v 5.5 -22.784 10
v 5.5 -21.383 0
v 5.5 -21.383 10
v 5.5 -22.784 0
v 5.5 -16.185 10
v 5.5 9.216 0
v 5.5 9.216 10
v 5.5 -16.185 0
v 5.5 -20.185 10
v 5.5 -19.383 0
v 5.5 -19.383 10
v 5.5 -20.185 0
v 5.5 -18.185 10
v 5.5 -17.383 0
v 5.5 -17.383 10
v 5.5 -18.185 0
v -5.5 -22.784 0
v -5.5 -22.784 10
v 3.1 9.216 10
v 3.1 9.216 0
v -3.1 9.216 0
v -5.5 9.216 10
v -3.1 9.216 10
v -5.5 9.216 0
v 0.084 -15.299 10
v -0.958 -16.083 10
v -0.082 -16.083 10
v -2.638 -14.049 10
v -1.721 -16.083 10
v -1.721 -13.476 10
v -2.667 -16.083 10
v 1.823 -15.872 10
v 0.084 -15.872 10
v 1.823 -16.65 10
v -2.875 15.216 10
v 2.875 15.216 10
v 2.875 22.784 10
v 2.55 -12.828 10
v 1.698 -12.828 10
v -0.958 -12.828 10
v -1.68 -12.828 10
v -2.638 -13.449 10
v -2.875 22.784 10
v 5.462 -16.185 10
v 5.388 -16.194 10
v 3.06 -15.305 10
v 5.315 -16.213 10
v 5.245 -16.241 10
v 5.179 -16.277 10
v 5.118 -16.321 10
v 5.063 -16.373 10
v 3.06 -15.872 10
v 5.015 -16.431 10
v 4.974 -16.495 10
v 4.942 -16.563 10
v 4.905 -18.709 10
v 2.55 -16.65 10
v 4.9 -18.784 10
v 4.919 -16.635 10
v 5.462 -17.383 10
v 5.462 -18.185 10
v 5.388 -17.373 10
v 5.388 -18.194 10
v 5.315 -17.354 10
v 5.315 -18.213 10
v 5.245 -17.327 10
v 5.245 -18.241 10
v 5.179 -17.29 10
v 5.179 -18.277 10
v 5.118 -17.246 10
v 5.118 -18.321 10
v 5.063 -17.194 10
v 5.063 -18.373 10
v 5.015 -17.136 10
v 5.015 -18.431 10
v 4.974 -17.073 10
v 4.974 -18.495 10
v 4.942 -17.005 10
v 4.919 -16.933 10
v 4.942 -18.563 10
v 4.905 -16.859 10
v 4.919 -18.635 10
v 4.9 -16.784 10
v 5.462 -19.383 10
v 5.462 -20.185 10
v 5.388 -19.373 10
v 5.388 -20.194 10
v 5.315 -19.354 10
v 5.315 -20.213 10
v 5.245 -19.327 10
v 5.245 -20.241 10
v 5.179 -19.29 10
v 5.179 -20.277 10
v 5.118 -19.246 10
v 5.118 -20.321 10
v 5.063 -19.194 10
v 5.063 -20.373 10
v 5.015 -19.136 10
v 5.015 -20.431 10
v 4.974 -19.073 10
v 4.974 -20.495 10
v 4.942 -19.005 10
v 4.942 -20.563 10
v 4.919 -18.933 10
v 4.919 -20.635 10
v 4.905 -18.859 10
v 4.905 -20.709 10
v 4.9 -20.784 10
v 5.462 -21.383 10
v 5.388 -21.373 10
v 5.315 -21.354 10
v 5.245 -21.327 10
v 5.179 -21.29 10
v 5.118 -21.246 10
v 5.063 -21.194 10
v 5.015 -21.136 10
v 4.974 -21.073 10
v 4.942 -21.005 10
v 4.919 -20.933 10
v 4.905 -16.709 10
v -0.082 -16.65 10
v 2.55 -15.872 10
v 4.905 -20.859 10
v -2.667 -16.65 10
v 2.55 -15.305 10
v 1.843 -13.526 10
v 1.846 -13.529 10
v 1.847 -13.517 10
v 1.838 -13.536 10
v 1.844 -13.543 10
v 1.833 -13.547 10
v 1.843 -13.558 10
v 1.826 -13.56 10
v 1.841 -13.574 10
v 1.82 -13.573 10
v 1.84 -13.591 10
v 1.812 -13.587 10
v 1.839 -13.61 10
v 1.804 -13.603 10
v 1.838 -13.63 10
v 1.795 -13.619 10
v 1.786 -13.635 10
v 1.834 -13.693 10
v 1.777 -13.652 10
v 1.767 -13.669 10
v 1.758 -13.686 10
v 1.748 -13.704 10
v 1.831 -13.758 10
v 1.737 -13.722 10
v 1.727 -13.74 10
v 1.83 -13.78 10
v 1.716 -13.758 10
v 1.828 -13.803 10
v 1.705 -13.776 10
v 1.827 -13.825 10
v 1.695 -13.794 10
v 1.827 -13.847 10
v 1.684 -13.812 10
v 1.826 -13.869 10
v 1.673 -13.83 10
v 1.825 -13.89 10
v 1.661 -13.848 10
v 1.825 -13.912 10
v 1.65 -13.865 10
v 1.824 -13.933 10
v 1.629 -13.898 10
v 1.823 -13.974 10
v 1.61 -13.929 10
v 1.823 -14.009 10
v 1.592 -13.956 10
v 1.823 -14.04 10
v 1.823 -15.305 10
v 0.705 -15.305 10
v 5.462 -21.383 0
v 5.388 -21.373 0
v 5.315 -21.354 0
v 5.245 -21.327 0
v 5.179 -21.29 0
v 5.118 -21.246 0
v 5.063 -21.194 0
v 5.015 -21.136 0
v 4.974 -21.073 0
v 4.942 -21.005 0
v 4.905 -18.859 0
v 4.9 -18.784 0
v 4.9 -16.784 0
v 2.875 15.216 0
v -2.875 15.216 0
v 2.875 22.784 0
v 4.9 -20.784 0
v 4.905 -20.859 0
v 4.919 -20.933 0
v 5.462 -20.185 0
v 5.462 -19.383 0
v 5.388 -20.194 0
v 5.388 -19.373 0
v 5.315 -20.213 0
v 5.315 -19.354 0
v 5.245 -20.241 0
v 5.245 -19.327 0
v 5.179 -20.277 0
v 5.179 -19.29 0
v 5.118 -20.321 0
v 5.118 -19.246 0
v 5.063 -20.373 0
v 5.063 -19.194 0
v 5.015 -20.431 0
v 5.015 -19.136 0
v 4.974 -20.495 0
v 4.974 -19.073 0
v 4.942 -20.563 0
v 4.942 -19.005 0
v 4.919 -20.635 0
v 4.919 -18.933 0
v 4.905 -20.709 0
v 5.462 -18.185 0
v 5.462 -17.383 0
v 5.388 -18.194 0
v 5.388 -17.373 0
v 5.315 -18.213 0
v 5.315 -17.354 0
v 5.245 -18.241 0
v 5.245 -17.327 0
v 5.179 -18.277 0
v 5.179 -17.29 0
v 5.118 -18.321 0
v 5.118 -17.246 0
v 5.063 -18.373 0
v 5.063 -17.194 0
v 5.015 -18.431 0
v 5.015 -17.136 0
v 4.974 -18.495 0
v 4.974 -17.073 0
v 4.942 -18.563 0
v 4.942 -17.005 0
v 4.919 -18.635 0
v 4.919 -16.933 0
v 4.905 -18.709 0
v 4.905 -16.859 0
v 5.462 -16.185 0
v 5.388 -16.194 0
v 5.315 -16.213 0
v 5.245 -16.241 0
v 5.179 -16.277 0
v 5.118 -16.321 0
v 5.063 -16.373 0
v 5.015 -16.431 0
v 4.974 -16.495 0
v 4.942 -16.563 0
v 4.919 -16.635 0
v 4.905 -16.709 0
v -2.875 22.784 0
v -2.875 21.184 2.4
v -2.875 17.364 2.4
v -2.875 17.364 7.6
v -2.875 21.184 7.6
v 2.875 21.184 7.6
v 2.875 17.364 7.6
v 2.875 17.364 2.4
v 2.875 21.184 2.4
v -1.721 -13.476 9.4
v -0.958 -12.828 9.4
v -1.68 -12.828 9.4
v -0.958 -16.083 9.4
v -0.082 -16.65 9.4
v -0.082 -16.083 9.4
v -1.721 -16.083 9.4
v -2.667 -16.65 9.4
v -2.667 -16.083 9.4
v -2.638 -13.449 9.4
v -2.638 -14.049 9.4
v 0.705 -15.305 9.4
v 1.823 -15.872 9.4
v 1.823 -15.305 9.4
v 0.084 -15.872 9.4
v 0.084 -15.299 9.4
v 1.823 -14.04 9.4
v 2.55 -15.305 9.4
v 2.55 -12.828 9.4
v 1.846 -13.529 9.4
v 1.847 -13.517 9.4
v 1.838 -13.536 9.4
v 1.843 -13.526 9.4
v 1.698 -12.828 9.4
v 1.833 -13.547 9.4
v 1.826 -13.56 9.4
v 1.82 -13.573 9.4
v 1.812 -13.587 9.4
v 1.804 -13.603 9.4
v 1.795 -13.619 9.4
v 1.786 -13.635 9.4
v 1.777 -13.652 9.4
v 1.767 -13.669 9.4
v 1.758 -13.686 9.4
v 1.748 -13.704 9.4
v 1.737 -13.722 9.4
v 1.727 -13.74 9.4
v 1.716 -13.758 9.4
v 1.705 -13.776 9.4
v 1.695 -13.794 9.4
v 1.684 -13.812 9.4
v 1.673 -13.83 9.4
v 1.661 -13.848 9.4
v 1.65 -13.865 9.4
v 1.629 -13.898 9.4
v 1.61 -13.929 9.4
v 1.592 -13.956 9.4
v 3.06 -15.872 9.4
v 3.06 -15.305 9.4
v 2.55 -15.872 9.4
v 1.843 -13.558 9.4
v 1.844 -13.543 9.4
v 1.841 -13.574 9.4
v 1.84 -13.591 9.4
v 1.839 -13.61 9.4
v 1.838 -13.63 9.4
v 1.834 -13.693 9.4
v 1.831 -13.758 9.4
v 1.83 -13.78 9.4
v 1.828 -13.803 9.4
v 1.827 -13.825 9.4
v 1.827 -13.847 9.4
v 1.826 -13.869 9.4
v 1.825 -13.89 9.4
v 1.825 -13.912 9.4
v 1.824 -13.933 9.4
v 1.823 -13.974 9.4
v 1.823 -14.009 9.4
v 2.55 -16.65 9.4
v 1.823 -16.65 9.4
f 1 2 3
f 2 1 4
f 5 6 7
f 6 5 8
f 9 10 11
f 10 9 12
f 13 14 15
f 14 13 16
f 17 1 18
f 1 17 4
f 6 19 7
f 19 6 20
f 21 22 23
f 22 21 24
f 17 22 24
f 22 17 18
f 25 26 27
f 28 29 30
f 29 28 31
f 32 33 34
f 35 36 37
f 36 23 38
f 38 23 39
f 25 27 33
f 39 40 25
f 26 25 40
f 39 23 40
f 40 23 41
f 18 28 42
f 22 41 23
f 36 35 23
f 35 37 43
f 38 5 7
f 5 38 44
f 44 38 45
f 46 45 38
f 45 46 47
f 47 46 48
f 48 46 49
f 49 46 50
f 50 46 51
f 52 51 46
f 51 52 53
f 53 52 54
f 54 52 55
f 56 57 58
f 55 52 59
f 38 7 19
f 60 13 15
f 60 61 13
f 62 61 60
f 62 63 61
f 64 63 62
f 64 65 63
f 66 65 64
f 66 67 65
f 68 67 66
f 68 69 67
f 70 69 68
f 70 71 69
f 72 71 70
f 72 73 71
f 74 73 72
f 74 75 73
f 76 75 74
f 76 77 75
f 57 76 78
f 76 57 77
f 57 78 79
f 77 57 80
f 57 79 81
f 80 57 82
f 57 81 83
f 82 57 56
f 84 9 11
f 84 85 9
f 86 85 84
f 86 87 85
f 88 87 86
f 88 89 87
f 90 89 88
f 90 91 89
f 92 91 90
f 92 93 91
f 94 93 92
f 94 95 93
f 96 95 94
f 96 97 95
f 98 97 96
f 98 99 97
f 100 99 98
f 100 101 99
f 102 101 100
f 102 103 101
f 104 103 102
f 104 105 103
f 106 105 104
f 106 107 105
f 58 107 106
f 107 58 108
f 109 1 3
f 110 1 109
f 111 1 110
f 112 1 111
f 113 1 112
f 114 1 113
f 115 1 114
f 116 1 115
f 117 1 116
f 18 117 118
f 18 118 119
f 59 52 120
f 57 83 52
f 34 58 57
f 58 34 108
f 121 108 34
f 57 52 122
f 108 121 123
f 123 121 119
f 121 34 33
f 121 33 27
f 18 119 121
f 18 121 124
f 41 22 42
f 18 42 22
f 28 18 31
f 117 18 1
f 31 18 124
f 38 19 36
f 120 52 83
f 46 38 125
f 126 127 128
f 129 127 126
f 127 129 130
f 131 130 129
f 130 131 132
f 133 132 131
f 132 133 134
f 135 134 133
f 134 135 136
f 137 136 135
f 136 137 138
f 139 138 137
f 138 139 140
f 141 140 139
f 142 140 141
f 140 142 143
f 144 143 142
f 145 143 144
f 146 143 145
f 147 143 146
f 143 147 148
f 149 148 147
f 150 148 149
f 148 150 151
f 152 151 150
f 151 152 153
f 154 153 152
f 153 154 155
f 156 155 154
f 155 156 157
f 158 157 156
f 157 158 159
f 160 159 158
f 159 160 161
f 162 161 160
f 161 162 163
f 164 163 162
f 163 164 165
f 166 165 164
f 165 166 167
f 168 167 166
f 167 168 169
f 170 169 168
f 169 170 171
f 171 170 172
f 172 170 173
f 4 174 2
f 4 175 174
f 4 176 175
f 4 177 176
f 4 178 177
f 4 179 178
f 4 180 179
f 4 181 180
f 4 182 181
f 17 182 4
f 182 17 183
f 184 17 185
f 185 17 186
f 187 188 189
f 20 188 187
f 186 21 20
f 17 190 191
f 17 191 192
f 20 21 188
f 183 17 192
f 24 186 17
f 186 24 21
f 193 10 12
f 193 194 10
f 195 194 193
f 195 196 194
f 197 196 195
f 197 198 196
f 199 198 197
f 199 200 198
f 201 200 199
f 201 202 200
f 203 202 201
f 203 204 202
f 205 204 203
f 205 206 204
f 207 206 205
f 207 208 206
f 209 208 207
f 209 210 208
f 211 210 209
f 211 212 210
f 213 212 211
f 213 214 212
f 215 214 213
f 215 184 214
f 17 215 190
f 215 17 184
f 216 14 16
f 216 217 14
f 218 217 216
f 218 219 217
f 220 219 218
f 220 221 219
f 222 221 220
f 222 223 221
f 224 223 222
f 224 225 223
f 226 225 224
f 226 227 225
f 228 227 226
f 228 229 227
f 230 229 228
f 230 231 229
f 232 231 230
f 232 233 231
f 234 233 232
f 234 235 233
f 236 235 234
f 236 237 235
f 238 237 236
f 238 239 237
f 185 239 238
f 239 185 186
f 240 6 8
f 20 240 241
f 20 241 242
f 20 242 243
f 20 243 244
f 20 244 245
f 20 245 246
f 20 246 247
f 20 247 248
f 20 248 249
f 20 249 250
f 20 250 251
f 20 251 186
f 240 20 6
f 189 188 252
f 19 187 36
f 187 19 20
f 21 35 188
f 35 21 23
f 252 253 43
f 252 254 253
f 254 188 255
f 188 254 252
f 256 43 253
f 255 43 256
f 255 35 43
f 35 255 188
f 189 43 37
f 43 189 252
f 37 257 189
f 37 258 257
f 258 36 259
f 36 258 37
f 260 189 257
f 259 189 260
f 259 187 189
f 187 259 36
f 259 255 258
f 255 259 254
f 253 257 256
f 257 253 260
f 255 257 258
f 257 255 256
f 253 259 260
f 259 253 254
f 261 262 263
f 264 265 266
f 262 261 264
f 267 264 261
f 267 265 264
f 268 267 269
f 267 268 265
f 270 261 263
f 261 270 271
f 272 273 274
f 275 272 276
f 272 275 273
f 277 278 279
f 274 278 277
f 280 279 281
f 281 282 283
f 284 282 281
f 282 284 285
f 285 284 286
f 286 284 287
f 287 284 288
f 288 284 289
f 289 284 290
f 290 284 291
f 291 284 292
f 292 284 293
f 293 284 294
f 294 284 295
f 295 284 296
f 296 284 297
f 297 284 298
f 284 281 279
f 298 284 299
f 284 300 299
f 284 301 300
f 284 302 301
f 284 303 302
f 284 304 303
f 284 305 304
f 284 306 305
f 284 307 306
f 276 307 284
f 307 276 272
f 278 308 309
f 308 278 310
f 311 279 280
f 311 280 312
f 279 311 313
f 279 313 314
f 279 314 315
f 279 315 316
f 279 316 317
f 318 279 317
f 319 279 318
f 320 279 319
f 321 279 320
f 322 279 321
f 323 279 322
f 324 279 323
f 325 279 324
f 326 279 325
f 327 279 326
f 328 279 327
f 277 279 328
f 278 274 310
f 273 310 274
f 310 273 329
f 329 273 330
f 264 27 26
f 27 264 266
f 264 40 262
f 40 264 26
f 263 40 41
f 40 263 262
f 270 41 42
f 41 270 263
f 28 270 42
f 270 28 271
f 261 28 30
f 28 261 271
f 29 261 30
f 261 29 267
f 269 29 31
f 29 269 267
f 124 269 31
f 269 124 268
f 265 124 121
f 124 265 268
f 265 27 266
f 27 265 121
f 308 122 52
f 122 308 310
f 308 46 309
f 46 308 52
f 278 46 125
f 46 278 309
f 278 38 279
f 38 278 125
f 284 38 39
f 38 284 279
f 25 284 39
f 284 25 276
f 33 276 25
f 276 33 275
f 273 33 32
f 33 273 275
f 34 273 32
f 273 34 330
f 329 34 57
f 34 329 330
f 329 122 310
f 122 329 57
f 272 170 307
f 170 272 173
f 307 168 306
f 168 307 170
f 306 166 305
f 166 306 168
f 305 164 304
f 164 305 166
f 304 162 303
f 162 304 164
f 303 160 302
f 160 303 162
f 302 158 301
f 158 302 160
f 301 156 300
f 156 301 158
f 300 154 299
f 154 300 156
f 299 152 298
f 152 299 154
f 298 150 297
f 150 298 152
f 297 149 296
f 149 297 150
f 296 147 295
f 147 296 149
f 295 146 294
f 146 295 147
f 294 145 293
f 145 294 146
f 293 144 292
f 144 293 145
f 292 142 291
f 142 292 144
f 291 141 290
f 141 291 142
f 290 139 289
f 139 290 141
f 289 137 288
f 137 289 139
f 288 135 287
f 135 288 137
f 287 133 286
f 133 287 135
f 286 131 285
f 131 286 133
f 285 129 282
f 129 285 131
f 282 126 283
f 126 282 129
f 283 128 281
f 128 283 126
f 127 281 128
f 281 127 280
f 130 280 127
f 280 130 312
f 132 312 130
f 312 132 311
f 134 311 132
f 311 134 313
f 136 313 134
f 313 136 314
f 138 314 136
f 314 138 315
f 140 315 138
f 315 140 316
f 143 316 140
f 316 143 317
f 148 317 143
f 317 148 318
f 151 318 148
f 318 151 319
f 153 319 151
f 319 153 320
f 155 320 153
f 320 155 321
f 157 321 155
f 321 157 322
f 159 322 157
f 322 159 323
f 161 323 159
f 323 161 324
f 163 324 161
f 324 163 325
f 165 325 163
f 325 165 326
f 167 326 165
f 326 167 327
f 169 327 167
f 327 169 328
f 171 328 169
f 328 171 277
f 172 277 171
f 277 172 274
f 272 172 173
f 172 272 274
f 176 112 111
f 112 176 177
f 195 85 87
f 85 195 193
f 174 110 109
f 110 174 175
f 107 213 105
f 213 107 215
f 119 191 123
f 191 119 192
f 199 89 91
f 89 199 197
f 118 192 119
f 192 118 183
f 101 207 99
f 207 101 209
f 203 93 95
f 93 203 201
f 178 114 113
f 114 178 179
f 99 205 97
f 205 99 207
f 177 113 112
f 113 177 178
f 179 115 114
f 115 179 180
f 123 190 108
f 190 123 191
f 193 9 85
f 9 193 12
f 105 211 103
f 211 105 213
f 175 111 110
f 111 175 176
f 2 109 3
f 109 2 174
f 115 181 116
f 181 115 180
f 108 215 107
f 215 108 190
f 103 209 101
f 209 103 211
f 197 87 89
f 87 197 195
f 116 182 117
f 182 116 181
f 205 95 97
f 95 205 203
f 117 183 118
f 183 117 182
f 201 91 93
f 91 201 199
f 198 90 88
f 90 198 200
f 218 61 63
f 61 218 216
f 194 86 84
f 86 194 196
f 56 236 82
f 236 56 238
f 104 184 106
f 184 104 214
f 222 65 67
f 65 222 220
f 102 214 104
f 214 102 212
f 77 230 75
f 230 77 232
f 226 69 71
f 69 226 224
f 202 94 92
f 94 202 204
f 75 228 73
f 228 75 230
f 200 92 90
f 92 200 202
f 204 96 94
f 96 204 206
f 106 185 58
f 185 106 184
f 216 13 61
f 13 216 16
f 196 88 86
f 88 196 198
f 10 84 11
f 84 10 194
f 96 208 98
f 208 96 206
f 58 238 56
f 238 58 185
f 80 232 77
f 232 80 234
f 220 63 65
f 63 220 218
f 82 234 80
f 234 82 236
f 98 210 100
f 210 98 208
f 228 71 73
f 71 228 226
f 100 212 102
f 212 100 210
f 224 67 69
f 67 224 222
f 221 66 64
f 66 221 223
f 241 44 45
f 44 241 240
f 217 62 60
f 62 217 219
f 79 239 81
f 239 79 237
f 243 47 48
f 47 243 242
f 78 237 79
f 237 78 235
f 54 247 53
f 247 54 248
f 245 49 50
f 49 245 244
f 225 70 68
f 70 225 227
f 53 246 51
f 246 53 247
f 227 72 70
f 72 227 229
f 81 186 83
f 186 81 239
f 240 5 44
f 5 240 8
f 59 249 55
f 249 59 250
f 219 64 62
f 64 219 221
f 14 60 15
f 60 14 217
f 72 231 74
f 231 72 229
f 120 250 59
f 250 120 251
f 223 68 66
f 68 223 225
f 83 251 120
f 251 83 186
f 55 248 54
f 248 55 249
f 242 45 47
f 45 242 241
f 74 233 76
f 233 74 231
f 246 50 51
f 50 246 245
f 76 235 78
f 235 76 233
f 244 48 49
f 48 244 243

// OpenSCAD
$fn = 50;

difference() {
	union() {
		translate(v = [0, 9.21625, 0]) {
			rotate(a = [90, 0, 0]) {
				difference() {
					union() {
						translate(v = [-5.5, 0, 0]) {
							cube(size = [11.0, 10.0, 32.0]);
						}
						translate(v = [0, 10.0, 0]) {
							rotate(a = [90, 0, 0]) {
								linear_extrude(height = 10.0) {
									polygon(points = [[-2.875, -13.5675], [2.875, -13.5675], [2.875, -6.0], [3.1, 0], [3.1, 0.1], [-3.1, 0.1], [-3.1, 0], [-2.875, -6.0]]);
								}
							}
						}
					}
					union() {
						translate(v = [-2.975, 2.4000000000000004, -11.9675]) {
							cube(size = [5.95, 5.199999999999999, 3.8200000000000003]);
						}
						translate(v = [0, 9.4, 24.0]) {
							rotate(a = [-90, 0, 0]) {
								linear_extrude(height = 0.7) {
									text(font = "Arial:style=Bold", halign = "center", size = 4.0, text = "14", valign = "center");
								}
							}
						}
						translate(v = [5.5, 10.1, 30.0]) {
							rotate(a = [90, 0, 0]) {
								cylinder(h = 10.2, r = 0.6);
							}
						}
						translate(v = [5.5, 10.1, 28.0]) {
							rotate(a = [90, 0, 0]) {
								cylinder(h = 10.2, r = 0.6);
							}
						}
						translate(v = [5.5, 10.1, 26.0]) {
							rotate(a = [90, 0, 0]) {
								cylinder(h = 10.2, r = 0.6);
							}
						}
					}
				}
			}
		}
	}
	union();
}
